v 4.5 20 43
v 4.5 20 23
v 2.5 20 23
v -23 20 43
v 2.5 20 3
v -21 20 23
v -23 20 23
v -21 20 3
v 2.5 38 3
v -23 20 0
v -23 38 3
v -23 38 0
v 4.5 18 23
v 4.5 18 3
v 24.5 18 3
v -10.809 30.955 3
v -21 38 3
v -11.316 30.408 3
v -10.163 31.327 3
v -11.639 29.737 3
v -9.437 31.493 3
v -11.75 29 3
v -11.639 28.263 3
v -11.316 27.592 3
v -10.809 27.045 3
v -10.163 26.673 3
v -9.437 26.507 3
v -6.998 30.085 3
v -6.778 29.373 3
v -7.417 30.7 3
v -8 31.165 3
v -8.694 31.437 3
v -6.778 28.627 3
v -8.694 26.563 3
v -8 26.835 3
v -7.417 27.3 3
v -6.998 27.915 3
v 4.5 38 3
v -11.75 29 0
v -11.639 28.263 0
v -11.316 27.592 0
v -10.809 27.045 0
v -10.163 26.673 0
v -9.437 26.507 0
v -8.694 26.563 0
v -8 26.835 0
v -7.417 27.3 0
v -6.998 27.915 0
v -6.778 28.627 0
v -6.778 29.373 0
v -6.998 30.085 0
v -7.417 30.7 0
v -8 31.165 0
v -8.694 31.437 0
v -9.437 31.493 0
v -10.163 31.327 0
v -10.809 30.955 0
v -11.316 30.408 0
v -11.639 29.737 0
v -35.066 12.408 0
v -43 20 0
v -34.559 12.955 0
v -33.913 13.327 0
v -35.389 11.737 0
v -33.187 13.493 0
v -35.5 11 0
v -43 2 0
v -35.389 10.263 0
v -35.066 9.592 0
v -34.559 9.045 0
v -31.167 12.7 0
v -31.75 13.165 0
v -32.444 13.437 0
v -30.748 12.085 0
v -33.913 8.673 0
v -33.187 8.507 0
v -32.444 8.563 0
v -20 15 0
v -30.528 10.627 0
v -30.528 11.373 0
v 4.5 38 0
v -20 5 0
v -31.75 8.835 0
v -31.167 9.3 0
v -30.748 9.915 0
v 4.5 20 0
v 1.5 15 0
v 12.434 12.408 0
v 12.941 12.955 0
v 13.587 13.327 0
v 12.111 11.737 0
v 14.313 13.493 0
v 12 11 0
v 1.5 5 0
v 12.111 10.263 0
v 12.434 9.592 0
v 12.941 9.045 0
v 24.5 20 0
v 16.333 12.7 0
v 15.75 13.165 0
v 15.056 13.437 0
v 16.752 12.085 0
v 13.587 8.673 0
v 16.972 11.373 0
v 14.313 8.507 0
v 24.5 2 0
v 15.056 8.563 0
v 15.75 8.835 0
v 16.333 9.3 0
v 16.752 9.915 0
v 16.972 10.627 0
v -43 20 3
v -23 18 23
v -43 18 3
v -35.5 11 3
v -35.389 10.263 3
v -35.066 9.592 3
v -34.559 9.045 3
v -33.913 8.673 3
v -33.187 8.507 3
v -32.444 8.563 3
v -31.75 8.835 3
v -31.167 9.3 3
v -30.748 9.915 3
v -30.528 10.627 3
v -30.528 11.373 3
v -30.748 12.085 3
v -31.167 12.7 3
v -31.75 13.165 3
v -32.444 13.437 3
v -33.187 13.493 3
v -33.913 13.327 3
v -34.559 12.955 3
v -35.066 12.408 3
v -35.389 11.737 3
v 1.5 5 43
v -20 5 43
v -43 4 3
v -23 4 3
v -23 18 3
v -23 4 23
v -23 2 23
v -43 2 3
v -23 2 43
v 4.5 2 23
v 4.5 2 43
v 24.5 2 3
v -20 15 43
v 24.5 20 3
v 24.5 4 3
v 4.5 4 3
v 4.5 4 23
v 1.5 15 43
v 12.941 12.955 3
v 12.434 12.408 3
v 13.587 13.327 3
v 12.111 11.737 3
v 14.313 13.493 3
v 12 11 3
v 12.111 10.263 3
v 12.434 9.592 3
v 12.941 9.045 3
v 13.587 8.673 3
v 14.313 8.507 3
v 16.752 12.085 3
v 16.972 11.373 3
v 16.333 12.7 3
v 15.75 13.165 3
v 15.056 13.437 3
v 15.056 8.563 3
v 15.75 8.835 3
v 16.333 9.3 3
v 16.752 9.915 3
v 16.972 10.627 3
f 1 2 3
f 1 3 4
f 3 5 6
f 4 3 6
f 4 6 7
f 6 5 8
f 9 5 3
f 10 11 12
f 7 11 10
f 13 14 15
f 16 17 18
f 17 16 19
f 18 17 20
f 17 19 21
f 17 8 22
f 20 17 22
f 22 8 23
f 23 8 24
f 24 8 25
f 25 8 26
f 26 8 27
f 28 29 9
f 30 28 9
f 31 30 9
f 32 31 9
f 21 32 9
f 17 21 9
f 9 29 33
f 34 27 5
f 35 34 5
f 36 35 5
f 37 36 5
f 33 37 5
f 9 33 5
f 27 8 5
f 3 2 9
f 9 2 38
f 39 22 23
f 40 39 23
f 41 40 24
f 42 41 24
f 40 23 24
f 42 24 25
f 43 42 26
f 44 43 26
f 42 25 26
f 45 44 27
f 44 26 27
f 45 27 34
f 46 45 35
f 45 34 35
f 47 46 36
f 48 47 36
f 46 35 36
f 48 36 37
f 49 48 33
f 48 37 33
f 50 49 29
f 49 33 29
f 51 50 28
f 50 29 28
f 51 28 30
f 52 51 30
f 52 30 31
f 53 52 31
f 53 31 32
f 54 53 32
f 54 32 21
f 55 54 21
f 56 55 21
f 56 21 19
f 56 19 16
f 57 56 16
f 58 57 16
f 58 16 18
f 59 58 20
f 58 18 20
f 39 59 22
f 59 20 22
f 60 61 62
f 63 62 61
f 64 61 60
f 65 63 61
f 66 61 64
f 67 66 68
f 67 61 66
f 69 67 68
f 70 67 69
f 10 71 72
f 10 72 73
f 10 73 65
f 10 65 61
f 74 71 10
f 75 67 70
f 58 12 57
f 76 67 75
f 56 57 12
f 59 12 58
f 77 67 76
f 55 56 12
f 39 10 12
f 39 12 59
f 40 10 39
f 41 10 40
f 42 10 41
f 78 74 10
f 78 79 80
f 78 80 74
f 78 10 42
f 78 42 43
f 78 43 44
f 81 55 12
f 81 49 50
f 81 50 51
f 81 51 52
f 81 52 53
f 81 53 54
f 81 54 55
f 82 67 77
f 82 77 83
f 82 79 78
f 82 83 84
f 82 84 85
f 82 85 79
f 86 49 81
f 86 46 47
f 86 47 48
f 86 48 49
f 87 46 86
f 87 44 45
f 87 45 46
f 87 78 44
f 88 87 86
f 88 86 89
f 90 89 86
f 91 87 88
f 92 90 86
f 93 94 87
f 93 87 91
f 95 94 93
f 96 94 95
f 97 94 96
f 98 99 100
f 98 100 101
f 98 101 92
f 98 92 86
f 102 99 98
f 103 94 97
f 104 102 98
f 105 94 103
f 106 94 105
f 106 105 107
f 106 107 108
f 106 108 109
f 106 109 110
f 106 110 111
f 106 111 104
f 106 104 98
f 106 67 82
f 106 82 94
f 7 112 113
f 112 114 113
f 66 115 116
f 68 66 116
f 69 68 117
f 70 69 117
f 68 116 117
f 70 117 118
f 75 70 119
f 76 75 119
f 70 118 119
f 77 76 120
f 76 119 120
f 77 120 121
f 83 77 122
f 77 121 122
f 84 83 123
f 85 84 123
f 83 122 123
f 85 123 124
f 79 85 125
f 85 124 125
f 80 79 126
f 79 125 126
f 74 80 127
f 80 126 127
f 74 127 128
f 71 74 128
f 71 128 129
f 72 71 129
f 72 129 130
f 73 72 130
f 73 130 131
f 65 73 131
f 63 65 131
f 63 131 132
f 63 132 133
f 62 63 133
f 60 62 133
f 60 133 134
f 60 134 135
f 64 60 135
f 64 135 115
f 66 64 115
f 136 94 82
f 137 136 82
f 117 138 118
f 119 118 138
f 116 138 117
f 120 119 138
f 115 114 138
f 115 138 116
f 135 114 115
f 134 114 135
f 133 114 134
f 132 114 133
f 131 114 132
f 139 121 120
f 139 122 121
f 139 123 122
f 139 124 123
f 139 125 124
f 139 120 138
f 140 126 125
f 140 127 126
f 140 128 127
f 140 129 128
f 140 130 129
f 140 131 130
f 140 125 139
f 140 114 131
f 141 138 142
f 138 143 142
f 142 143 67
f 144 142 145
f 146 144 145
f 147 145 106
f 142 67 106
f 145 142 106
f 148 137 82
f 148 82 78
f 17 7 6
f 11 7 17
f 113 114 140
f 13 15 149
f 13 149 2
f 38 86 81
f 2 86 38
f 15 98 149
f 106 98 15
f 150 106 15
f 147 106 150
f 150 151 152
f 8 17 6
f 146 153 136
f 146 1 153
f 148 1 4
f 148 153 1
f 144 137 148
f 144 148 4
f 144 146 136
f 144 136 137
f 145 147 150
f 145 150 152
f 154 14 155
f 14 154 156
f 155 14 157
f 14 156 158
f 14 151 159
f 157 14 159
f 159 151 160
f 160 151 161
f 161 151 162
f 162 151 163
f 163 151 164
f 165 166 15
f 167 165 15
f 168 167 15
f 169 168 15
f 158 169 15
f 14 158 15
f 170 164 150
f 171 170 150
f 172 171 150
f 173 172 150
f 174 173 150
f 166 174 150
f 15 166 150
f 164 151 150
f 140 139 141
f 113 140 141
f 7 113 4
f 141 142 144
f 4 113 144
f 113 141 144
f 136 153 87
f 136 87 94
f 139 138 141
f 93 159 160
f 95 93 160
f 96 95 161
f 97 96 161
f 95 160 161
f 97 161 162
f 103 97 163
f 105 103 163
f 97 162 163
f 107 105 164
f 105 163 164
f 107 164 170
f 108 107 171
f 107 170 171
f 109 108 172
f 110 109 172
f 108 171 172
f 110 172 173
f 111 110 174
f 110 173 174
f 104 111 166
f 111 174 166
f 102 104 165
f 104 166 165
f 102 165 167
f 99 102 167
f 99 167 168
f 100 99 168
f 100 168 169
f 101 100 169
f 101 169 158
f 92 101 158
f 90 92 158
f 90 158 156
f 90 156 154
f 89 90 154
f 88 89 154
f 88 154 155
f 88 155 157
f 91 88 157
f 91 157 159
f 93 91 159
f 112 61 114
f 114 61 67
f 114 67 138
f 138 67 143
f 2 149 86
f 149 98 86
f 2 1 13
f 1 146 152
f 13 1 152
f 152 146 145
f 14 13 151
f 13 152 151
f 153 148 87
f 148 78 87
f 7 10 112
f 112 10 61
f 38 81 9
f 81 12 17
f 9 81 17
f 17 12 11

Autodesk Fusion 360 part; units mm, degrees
sketch "Szkic1" plane through (0, 0, 0) normal (0, 0, 1) x (1, 0, 0)
  line L0 (-20, 15) -> (1.5, 15)
  line L1 (1.5, 15) -> (1.5, 5)
  line L2 (1.5, 5) -> (-20, 5)
  line L3 (-20, 5) -> (-20, 15)
  line L4 (-23, 18) -> (4.5, 18)
  line L5 (4.5, 18) -> (4.5, 2)
  line L6 (4.5, 2) -> (-23, 2)
  line L7 (-23, 2) -> (-23, 18)
  line L8 (-43, 18) -> (24.5, 18)
  line L9 (24.5, 18) -> (24.5, 2)
  line L10 (24.5, 2) -> (-43, 2)
  line L11 (-43, 2) -> (-43, 18)
  line L12 (-23, 18) -> (4, 18)
  line L13 (4, 18) -> (4, 38)
  line L14 (4, 38) -> (-23, 38)
  line L15 (-23, 38) -> (-23, 18)
  dimension "d1" = 21.5
  dimension "d2" = 10
  dimension "d3" = 3
  dimension "d4" = 3
  dimension "d5" = 3
  dimension "d6" = 3
  dimension "d7" = 20
  dimension "d8" = 20
extrude "Wyciągnięcie proste4" add sketch "Szkic1" along normal blind 3 contours L4 L8 L12 L13 L14 L15 | L7 L8 L10 L11 | L5 L8 L9 L10 makes body 1 at (-36.3333, 12.6667, 0) makes body 2 at (17.8333, 7.3333, 0)
extrude "Wyciągnięcie proste5" add sketch "Szkic1" along normal blind 30 contours L4 L5 L6 L7 L8 L10 L12 bodies 1 2
extrude "Extrude6" add 1 faces at (-12.8333, 3, 30) along direction (0, 0, 1) blind 10 on bodies 1 bodies 1
extrude "Extrude7" add 1 faces at (-12.8333, 3, 40) along direction (0, 0, 1) blind 3 on bodies 1 bodies 1
sketch "Sketch2" plane through (0, 0, 0) normal (0, 1, 0) x (1, 0, 0)
  line L0 (-43, -3) -> (-23, -23)
  line L1 (-23, -23) -> (-23, -3)
  line L2 (-23, -3) -> (-43, -3)
  line L3 (24.5, -3) -> (4.5, -23)
  line L4 (4.5, -23) -> (4.5, -3)
  line L5 (4.5, -3) -> (24.5, -3)
  dimension "d23" = 135
extrude "Extrude8" add sketch "Sketch2" along normal blind 2 from surface at 2 contours L0 L1 L2 bodies 1
extrude "Extrude9" add sketch "Sketch2" along normal blind 2 from surface at 2 contours L3 L4 L5 bodies 1
extrude "Extrude10" add 1 faces at (4, 24.6667, 1) along direction (1, 0, 0) blind 0.5 on bodies 1 bodies 1
extrude "Extrude11" add 1 faces at (11.1667, 18, 1) along direction (0, 1, 0) blind 2 on bodies 1 bodies 1
extrude "Extrude12" add sketch "Sketch2" along normal blind 2 from surface at 18 contours L3 L4 L5 bodies 1
extrude "Extrude13" add sketch "Sketch2" along normal blind 2 from surface at 18 separate body contours L0 L1 L2 makes body 3
extrude "Extrude14" add 1 faces at (-36.3333, 18, 1) along direction (0, 1, 0) blind 2 on bodies 1 bodies 1 3
extrude "Extrude15" add 1 faces at (-13.8333, 18, 16.3333) along direction (0, 1, 0) blind 2 on bodies 1 bodies 1
sketch "Sketch3" plane through (4.5, 0, 0) normal (1, 0, 0) x (0, 1, 0)
  line L0 (20, 3) -> (20, 0)
  line L1 (20, 0) -> (38, 0)
  line L2 (38, 0) -> (38, 3)
  line L3 (38, 3) -> (20, 3)
  line L4 (20, 23) -> (38, 3)
  line L5 (20, 3) -> (20, 23)
sketch "Sketch4" plane through (-23, 0, 0) normal (-1, 0, 0) x (0, -1, 0)
  line L0 (-20, 0) -> (-20, 3)
  line L1 (-20, 3) -> (-38, 3)
  line L2 (-38, 3) -> (-38, 0)
  line L3 (-38, 0) -> (-20, 0)
  line L4 (-38, 3) -> (-20, 3)
  line L5 (-20, 23) -> (-38, 3)
  line L6 (-20, 23) -> (-20, 3)
extrude "Extrude16" add sketch "Sketch3" against normal blind 2 contours L3 L4 L5 bodies 1
extrude "Extrude17" add sketch "Sketch4" against normal blind 2 contours L1 L4 L5 L6 bodies 1
sketch "Sketch5" plane through (0, 0, 3) normal (0, 0, 1) x (-1, 0, 0)
  line L0 (-24.5, -18) -> (-4.5, -18)
  line L1 (-4.5, -18) -> (-4.5, -4)
  line L2 (-4.5, -4) -> (-24.5, -4)
  line L3 (-24.5, -4) -> (-24.5, -18)
  circle A0 centre (-14.5, -11) radius 2.5
  circle A1 centre (33, -11) radius 2.5
  line L4 (23, -2) -> (23, -20)
  circle A2 centre (9.25, -29) radius 2.5
  line L5 (21, -38) -> (21, -20)
  line L6 (21, -38) -> (-2.5, -38)
  dimension "d48" = 5
  dimension "d49" = 7
  dimension "d50" = 5
  dimension "d51" = 10
  dimension "d52" = 10
  dimension "d53" = 5
  dimension "d54" = 11.75
  dimension "d55" = 9
extrude "Extrude18" cut sketch "Sketch5" against normal blind 8 contours A0 | A1 | A2 bodies 1
equation "d23 = 180 deg - 45 deg"
equation "d34 = 14.00 mm + 4 mm"
equation "d37 = 14.00 mm + 4 mm"
equation "d54 = ( 23.5 / 2 ) * 1 mm"
